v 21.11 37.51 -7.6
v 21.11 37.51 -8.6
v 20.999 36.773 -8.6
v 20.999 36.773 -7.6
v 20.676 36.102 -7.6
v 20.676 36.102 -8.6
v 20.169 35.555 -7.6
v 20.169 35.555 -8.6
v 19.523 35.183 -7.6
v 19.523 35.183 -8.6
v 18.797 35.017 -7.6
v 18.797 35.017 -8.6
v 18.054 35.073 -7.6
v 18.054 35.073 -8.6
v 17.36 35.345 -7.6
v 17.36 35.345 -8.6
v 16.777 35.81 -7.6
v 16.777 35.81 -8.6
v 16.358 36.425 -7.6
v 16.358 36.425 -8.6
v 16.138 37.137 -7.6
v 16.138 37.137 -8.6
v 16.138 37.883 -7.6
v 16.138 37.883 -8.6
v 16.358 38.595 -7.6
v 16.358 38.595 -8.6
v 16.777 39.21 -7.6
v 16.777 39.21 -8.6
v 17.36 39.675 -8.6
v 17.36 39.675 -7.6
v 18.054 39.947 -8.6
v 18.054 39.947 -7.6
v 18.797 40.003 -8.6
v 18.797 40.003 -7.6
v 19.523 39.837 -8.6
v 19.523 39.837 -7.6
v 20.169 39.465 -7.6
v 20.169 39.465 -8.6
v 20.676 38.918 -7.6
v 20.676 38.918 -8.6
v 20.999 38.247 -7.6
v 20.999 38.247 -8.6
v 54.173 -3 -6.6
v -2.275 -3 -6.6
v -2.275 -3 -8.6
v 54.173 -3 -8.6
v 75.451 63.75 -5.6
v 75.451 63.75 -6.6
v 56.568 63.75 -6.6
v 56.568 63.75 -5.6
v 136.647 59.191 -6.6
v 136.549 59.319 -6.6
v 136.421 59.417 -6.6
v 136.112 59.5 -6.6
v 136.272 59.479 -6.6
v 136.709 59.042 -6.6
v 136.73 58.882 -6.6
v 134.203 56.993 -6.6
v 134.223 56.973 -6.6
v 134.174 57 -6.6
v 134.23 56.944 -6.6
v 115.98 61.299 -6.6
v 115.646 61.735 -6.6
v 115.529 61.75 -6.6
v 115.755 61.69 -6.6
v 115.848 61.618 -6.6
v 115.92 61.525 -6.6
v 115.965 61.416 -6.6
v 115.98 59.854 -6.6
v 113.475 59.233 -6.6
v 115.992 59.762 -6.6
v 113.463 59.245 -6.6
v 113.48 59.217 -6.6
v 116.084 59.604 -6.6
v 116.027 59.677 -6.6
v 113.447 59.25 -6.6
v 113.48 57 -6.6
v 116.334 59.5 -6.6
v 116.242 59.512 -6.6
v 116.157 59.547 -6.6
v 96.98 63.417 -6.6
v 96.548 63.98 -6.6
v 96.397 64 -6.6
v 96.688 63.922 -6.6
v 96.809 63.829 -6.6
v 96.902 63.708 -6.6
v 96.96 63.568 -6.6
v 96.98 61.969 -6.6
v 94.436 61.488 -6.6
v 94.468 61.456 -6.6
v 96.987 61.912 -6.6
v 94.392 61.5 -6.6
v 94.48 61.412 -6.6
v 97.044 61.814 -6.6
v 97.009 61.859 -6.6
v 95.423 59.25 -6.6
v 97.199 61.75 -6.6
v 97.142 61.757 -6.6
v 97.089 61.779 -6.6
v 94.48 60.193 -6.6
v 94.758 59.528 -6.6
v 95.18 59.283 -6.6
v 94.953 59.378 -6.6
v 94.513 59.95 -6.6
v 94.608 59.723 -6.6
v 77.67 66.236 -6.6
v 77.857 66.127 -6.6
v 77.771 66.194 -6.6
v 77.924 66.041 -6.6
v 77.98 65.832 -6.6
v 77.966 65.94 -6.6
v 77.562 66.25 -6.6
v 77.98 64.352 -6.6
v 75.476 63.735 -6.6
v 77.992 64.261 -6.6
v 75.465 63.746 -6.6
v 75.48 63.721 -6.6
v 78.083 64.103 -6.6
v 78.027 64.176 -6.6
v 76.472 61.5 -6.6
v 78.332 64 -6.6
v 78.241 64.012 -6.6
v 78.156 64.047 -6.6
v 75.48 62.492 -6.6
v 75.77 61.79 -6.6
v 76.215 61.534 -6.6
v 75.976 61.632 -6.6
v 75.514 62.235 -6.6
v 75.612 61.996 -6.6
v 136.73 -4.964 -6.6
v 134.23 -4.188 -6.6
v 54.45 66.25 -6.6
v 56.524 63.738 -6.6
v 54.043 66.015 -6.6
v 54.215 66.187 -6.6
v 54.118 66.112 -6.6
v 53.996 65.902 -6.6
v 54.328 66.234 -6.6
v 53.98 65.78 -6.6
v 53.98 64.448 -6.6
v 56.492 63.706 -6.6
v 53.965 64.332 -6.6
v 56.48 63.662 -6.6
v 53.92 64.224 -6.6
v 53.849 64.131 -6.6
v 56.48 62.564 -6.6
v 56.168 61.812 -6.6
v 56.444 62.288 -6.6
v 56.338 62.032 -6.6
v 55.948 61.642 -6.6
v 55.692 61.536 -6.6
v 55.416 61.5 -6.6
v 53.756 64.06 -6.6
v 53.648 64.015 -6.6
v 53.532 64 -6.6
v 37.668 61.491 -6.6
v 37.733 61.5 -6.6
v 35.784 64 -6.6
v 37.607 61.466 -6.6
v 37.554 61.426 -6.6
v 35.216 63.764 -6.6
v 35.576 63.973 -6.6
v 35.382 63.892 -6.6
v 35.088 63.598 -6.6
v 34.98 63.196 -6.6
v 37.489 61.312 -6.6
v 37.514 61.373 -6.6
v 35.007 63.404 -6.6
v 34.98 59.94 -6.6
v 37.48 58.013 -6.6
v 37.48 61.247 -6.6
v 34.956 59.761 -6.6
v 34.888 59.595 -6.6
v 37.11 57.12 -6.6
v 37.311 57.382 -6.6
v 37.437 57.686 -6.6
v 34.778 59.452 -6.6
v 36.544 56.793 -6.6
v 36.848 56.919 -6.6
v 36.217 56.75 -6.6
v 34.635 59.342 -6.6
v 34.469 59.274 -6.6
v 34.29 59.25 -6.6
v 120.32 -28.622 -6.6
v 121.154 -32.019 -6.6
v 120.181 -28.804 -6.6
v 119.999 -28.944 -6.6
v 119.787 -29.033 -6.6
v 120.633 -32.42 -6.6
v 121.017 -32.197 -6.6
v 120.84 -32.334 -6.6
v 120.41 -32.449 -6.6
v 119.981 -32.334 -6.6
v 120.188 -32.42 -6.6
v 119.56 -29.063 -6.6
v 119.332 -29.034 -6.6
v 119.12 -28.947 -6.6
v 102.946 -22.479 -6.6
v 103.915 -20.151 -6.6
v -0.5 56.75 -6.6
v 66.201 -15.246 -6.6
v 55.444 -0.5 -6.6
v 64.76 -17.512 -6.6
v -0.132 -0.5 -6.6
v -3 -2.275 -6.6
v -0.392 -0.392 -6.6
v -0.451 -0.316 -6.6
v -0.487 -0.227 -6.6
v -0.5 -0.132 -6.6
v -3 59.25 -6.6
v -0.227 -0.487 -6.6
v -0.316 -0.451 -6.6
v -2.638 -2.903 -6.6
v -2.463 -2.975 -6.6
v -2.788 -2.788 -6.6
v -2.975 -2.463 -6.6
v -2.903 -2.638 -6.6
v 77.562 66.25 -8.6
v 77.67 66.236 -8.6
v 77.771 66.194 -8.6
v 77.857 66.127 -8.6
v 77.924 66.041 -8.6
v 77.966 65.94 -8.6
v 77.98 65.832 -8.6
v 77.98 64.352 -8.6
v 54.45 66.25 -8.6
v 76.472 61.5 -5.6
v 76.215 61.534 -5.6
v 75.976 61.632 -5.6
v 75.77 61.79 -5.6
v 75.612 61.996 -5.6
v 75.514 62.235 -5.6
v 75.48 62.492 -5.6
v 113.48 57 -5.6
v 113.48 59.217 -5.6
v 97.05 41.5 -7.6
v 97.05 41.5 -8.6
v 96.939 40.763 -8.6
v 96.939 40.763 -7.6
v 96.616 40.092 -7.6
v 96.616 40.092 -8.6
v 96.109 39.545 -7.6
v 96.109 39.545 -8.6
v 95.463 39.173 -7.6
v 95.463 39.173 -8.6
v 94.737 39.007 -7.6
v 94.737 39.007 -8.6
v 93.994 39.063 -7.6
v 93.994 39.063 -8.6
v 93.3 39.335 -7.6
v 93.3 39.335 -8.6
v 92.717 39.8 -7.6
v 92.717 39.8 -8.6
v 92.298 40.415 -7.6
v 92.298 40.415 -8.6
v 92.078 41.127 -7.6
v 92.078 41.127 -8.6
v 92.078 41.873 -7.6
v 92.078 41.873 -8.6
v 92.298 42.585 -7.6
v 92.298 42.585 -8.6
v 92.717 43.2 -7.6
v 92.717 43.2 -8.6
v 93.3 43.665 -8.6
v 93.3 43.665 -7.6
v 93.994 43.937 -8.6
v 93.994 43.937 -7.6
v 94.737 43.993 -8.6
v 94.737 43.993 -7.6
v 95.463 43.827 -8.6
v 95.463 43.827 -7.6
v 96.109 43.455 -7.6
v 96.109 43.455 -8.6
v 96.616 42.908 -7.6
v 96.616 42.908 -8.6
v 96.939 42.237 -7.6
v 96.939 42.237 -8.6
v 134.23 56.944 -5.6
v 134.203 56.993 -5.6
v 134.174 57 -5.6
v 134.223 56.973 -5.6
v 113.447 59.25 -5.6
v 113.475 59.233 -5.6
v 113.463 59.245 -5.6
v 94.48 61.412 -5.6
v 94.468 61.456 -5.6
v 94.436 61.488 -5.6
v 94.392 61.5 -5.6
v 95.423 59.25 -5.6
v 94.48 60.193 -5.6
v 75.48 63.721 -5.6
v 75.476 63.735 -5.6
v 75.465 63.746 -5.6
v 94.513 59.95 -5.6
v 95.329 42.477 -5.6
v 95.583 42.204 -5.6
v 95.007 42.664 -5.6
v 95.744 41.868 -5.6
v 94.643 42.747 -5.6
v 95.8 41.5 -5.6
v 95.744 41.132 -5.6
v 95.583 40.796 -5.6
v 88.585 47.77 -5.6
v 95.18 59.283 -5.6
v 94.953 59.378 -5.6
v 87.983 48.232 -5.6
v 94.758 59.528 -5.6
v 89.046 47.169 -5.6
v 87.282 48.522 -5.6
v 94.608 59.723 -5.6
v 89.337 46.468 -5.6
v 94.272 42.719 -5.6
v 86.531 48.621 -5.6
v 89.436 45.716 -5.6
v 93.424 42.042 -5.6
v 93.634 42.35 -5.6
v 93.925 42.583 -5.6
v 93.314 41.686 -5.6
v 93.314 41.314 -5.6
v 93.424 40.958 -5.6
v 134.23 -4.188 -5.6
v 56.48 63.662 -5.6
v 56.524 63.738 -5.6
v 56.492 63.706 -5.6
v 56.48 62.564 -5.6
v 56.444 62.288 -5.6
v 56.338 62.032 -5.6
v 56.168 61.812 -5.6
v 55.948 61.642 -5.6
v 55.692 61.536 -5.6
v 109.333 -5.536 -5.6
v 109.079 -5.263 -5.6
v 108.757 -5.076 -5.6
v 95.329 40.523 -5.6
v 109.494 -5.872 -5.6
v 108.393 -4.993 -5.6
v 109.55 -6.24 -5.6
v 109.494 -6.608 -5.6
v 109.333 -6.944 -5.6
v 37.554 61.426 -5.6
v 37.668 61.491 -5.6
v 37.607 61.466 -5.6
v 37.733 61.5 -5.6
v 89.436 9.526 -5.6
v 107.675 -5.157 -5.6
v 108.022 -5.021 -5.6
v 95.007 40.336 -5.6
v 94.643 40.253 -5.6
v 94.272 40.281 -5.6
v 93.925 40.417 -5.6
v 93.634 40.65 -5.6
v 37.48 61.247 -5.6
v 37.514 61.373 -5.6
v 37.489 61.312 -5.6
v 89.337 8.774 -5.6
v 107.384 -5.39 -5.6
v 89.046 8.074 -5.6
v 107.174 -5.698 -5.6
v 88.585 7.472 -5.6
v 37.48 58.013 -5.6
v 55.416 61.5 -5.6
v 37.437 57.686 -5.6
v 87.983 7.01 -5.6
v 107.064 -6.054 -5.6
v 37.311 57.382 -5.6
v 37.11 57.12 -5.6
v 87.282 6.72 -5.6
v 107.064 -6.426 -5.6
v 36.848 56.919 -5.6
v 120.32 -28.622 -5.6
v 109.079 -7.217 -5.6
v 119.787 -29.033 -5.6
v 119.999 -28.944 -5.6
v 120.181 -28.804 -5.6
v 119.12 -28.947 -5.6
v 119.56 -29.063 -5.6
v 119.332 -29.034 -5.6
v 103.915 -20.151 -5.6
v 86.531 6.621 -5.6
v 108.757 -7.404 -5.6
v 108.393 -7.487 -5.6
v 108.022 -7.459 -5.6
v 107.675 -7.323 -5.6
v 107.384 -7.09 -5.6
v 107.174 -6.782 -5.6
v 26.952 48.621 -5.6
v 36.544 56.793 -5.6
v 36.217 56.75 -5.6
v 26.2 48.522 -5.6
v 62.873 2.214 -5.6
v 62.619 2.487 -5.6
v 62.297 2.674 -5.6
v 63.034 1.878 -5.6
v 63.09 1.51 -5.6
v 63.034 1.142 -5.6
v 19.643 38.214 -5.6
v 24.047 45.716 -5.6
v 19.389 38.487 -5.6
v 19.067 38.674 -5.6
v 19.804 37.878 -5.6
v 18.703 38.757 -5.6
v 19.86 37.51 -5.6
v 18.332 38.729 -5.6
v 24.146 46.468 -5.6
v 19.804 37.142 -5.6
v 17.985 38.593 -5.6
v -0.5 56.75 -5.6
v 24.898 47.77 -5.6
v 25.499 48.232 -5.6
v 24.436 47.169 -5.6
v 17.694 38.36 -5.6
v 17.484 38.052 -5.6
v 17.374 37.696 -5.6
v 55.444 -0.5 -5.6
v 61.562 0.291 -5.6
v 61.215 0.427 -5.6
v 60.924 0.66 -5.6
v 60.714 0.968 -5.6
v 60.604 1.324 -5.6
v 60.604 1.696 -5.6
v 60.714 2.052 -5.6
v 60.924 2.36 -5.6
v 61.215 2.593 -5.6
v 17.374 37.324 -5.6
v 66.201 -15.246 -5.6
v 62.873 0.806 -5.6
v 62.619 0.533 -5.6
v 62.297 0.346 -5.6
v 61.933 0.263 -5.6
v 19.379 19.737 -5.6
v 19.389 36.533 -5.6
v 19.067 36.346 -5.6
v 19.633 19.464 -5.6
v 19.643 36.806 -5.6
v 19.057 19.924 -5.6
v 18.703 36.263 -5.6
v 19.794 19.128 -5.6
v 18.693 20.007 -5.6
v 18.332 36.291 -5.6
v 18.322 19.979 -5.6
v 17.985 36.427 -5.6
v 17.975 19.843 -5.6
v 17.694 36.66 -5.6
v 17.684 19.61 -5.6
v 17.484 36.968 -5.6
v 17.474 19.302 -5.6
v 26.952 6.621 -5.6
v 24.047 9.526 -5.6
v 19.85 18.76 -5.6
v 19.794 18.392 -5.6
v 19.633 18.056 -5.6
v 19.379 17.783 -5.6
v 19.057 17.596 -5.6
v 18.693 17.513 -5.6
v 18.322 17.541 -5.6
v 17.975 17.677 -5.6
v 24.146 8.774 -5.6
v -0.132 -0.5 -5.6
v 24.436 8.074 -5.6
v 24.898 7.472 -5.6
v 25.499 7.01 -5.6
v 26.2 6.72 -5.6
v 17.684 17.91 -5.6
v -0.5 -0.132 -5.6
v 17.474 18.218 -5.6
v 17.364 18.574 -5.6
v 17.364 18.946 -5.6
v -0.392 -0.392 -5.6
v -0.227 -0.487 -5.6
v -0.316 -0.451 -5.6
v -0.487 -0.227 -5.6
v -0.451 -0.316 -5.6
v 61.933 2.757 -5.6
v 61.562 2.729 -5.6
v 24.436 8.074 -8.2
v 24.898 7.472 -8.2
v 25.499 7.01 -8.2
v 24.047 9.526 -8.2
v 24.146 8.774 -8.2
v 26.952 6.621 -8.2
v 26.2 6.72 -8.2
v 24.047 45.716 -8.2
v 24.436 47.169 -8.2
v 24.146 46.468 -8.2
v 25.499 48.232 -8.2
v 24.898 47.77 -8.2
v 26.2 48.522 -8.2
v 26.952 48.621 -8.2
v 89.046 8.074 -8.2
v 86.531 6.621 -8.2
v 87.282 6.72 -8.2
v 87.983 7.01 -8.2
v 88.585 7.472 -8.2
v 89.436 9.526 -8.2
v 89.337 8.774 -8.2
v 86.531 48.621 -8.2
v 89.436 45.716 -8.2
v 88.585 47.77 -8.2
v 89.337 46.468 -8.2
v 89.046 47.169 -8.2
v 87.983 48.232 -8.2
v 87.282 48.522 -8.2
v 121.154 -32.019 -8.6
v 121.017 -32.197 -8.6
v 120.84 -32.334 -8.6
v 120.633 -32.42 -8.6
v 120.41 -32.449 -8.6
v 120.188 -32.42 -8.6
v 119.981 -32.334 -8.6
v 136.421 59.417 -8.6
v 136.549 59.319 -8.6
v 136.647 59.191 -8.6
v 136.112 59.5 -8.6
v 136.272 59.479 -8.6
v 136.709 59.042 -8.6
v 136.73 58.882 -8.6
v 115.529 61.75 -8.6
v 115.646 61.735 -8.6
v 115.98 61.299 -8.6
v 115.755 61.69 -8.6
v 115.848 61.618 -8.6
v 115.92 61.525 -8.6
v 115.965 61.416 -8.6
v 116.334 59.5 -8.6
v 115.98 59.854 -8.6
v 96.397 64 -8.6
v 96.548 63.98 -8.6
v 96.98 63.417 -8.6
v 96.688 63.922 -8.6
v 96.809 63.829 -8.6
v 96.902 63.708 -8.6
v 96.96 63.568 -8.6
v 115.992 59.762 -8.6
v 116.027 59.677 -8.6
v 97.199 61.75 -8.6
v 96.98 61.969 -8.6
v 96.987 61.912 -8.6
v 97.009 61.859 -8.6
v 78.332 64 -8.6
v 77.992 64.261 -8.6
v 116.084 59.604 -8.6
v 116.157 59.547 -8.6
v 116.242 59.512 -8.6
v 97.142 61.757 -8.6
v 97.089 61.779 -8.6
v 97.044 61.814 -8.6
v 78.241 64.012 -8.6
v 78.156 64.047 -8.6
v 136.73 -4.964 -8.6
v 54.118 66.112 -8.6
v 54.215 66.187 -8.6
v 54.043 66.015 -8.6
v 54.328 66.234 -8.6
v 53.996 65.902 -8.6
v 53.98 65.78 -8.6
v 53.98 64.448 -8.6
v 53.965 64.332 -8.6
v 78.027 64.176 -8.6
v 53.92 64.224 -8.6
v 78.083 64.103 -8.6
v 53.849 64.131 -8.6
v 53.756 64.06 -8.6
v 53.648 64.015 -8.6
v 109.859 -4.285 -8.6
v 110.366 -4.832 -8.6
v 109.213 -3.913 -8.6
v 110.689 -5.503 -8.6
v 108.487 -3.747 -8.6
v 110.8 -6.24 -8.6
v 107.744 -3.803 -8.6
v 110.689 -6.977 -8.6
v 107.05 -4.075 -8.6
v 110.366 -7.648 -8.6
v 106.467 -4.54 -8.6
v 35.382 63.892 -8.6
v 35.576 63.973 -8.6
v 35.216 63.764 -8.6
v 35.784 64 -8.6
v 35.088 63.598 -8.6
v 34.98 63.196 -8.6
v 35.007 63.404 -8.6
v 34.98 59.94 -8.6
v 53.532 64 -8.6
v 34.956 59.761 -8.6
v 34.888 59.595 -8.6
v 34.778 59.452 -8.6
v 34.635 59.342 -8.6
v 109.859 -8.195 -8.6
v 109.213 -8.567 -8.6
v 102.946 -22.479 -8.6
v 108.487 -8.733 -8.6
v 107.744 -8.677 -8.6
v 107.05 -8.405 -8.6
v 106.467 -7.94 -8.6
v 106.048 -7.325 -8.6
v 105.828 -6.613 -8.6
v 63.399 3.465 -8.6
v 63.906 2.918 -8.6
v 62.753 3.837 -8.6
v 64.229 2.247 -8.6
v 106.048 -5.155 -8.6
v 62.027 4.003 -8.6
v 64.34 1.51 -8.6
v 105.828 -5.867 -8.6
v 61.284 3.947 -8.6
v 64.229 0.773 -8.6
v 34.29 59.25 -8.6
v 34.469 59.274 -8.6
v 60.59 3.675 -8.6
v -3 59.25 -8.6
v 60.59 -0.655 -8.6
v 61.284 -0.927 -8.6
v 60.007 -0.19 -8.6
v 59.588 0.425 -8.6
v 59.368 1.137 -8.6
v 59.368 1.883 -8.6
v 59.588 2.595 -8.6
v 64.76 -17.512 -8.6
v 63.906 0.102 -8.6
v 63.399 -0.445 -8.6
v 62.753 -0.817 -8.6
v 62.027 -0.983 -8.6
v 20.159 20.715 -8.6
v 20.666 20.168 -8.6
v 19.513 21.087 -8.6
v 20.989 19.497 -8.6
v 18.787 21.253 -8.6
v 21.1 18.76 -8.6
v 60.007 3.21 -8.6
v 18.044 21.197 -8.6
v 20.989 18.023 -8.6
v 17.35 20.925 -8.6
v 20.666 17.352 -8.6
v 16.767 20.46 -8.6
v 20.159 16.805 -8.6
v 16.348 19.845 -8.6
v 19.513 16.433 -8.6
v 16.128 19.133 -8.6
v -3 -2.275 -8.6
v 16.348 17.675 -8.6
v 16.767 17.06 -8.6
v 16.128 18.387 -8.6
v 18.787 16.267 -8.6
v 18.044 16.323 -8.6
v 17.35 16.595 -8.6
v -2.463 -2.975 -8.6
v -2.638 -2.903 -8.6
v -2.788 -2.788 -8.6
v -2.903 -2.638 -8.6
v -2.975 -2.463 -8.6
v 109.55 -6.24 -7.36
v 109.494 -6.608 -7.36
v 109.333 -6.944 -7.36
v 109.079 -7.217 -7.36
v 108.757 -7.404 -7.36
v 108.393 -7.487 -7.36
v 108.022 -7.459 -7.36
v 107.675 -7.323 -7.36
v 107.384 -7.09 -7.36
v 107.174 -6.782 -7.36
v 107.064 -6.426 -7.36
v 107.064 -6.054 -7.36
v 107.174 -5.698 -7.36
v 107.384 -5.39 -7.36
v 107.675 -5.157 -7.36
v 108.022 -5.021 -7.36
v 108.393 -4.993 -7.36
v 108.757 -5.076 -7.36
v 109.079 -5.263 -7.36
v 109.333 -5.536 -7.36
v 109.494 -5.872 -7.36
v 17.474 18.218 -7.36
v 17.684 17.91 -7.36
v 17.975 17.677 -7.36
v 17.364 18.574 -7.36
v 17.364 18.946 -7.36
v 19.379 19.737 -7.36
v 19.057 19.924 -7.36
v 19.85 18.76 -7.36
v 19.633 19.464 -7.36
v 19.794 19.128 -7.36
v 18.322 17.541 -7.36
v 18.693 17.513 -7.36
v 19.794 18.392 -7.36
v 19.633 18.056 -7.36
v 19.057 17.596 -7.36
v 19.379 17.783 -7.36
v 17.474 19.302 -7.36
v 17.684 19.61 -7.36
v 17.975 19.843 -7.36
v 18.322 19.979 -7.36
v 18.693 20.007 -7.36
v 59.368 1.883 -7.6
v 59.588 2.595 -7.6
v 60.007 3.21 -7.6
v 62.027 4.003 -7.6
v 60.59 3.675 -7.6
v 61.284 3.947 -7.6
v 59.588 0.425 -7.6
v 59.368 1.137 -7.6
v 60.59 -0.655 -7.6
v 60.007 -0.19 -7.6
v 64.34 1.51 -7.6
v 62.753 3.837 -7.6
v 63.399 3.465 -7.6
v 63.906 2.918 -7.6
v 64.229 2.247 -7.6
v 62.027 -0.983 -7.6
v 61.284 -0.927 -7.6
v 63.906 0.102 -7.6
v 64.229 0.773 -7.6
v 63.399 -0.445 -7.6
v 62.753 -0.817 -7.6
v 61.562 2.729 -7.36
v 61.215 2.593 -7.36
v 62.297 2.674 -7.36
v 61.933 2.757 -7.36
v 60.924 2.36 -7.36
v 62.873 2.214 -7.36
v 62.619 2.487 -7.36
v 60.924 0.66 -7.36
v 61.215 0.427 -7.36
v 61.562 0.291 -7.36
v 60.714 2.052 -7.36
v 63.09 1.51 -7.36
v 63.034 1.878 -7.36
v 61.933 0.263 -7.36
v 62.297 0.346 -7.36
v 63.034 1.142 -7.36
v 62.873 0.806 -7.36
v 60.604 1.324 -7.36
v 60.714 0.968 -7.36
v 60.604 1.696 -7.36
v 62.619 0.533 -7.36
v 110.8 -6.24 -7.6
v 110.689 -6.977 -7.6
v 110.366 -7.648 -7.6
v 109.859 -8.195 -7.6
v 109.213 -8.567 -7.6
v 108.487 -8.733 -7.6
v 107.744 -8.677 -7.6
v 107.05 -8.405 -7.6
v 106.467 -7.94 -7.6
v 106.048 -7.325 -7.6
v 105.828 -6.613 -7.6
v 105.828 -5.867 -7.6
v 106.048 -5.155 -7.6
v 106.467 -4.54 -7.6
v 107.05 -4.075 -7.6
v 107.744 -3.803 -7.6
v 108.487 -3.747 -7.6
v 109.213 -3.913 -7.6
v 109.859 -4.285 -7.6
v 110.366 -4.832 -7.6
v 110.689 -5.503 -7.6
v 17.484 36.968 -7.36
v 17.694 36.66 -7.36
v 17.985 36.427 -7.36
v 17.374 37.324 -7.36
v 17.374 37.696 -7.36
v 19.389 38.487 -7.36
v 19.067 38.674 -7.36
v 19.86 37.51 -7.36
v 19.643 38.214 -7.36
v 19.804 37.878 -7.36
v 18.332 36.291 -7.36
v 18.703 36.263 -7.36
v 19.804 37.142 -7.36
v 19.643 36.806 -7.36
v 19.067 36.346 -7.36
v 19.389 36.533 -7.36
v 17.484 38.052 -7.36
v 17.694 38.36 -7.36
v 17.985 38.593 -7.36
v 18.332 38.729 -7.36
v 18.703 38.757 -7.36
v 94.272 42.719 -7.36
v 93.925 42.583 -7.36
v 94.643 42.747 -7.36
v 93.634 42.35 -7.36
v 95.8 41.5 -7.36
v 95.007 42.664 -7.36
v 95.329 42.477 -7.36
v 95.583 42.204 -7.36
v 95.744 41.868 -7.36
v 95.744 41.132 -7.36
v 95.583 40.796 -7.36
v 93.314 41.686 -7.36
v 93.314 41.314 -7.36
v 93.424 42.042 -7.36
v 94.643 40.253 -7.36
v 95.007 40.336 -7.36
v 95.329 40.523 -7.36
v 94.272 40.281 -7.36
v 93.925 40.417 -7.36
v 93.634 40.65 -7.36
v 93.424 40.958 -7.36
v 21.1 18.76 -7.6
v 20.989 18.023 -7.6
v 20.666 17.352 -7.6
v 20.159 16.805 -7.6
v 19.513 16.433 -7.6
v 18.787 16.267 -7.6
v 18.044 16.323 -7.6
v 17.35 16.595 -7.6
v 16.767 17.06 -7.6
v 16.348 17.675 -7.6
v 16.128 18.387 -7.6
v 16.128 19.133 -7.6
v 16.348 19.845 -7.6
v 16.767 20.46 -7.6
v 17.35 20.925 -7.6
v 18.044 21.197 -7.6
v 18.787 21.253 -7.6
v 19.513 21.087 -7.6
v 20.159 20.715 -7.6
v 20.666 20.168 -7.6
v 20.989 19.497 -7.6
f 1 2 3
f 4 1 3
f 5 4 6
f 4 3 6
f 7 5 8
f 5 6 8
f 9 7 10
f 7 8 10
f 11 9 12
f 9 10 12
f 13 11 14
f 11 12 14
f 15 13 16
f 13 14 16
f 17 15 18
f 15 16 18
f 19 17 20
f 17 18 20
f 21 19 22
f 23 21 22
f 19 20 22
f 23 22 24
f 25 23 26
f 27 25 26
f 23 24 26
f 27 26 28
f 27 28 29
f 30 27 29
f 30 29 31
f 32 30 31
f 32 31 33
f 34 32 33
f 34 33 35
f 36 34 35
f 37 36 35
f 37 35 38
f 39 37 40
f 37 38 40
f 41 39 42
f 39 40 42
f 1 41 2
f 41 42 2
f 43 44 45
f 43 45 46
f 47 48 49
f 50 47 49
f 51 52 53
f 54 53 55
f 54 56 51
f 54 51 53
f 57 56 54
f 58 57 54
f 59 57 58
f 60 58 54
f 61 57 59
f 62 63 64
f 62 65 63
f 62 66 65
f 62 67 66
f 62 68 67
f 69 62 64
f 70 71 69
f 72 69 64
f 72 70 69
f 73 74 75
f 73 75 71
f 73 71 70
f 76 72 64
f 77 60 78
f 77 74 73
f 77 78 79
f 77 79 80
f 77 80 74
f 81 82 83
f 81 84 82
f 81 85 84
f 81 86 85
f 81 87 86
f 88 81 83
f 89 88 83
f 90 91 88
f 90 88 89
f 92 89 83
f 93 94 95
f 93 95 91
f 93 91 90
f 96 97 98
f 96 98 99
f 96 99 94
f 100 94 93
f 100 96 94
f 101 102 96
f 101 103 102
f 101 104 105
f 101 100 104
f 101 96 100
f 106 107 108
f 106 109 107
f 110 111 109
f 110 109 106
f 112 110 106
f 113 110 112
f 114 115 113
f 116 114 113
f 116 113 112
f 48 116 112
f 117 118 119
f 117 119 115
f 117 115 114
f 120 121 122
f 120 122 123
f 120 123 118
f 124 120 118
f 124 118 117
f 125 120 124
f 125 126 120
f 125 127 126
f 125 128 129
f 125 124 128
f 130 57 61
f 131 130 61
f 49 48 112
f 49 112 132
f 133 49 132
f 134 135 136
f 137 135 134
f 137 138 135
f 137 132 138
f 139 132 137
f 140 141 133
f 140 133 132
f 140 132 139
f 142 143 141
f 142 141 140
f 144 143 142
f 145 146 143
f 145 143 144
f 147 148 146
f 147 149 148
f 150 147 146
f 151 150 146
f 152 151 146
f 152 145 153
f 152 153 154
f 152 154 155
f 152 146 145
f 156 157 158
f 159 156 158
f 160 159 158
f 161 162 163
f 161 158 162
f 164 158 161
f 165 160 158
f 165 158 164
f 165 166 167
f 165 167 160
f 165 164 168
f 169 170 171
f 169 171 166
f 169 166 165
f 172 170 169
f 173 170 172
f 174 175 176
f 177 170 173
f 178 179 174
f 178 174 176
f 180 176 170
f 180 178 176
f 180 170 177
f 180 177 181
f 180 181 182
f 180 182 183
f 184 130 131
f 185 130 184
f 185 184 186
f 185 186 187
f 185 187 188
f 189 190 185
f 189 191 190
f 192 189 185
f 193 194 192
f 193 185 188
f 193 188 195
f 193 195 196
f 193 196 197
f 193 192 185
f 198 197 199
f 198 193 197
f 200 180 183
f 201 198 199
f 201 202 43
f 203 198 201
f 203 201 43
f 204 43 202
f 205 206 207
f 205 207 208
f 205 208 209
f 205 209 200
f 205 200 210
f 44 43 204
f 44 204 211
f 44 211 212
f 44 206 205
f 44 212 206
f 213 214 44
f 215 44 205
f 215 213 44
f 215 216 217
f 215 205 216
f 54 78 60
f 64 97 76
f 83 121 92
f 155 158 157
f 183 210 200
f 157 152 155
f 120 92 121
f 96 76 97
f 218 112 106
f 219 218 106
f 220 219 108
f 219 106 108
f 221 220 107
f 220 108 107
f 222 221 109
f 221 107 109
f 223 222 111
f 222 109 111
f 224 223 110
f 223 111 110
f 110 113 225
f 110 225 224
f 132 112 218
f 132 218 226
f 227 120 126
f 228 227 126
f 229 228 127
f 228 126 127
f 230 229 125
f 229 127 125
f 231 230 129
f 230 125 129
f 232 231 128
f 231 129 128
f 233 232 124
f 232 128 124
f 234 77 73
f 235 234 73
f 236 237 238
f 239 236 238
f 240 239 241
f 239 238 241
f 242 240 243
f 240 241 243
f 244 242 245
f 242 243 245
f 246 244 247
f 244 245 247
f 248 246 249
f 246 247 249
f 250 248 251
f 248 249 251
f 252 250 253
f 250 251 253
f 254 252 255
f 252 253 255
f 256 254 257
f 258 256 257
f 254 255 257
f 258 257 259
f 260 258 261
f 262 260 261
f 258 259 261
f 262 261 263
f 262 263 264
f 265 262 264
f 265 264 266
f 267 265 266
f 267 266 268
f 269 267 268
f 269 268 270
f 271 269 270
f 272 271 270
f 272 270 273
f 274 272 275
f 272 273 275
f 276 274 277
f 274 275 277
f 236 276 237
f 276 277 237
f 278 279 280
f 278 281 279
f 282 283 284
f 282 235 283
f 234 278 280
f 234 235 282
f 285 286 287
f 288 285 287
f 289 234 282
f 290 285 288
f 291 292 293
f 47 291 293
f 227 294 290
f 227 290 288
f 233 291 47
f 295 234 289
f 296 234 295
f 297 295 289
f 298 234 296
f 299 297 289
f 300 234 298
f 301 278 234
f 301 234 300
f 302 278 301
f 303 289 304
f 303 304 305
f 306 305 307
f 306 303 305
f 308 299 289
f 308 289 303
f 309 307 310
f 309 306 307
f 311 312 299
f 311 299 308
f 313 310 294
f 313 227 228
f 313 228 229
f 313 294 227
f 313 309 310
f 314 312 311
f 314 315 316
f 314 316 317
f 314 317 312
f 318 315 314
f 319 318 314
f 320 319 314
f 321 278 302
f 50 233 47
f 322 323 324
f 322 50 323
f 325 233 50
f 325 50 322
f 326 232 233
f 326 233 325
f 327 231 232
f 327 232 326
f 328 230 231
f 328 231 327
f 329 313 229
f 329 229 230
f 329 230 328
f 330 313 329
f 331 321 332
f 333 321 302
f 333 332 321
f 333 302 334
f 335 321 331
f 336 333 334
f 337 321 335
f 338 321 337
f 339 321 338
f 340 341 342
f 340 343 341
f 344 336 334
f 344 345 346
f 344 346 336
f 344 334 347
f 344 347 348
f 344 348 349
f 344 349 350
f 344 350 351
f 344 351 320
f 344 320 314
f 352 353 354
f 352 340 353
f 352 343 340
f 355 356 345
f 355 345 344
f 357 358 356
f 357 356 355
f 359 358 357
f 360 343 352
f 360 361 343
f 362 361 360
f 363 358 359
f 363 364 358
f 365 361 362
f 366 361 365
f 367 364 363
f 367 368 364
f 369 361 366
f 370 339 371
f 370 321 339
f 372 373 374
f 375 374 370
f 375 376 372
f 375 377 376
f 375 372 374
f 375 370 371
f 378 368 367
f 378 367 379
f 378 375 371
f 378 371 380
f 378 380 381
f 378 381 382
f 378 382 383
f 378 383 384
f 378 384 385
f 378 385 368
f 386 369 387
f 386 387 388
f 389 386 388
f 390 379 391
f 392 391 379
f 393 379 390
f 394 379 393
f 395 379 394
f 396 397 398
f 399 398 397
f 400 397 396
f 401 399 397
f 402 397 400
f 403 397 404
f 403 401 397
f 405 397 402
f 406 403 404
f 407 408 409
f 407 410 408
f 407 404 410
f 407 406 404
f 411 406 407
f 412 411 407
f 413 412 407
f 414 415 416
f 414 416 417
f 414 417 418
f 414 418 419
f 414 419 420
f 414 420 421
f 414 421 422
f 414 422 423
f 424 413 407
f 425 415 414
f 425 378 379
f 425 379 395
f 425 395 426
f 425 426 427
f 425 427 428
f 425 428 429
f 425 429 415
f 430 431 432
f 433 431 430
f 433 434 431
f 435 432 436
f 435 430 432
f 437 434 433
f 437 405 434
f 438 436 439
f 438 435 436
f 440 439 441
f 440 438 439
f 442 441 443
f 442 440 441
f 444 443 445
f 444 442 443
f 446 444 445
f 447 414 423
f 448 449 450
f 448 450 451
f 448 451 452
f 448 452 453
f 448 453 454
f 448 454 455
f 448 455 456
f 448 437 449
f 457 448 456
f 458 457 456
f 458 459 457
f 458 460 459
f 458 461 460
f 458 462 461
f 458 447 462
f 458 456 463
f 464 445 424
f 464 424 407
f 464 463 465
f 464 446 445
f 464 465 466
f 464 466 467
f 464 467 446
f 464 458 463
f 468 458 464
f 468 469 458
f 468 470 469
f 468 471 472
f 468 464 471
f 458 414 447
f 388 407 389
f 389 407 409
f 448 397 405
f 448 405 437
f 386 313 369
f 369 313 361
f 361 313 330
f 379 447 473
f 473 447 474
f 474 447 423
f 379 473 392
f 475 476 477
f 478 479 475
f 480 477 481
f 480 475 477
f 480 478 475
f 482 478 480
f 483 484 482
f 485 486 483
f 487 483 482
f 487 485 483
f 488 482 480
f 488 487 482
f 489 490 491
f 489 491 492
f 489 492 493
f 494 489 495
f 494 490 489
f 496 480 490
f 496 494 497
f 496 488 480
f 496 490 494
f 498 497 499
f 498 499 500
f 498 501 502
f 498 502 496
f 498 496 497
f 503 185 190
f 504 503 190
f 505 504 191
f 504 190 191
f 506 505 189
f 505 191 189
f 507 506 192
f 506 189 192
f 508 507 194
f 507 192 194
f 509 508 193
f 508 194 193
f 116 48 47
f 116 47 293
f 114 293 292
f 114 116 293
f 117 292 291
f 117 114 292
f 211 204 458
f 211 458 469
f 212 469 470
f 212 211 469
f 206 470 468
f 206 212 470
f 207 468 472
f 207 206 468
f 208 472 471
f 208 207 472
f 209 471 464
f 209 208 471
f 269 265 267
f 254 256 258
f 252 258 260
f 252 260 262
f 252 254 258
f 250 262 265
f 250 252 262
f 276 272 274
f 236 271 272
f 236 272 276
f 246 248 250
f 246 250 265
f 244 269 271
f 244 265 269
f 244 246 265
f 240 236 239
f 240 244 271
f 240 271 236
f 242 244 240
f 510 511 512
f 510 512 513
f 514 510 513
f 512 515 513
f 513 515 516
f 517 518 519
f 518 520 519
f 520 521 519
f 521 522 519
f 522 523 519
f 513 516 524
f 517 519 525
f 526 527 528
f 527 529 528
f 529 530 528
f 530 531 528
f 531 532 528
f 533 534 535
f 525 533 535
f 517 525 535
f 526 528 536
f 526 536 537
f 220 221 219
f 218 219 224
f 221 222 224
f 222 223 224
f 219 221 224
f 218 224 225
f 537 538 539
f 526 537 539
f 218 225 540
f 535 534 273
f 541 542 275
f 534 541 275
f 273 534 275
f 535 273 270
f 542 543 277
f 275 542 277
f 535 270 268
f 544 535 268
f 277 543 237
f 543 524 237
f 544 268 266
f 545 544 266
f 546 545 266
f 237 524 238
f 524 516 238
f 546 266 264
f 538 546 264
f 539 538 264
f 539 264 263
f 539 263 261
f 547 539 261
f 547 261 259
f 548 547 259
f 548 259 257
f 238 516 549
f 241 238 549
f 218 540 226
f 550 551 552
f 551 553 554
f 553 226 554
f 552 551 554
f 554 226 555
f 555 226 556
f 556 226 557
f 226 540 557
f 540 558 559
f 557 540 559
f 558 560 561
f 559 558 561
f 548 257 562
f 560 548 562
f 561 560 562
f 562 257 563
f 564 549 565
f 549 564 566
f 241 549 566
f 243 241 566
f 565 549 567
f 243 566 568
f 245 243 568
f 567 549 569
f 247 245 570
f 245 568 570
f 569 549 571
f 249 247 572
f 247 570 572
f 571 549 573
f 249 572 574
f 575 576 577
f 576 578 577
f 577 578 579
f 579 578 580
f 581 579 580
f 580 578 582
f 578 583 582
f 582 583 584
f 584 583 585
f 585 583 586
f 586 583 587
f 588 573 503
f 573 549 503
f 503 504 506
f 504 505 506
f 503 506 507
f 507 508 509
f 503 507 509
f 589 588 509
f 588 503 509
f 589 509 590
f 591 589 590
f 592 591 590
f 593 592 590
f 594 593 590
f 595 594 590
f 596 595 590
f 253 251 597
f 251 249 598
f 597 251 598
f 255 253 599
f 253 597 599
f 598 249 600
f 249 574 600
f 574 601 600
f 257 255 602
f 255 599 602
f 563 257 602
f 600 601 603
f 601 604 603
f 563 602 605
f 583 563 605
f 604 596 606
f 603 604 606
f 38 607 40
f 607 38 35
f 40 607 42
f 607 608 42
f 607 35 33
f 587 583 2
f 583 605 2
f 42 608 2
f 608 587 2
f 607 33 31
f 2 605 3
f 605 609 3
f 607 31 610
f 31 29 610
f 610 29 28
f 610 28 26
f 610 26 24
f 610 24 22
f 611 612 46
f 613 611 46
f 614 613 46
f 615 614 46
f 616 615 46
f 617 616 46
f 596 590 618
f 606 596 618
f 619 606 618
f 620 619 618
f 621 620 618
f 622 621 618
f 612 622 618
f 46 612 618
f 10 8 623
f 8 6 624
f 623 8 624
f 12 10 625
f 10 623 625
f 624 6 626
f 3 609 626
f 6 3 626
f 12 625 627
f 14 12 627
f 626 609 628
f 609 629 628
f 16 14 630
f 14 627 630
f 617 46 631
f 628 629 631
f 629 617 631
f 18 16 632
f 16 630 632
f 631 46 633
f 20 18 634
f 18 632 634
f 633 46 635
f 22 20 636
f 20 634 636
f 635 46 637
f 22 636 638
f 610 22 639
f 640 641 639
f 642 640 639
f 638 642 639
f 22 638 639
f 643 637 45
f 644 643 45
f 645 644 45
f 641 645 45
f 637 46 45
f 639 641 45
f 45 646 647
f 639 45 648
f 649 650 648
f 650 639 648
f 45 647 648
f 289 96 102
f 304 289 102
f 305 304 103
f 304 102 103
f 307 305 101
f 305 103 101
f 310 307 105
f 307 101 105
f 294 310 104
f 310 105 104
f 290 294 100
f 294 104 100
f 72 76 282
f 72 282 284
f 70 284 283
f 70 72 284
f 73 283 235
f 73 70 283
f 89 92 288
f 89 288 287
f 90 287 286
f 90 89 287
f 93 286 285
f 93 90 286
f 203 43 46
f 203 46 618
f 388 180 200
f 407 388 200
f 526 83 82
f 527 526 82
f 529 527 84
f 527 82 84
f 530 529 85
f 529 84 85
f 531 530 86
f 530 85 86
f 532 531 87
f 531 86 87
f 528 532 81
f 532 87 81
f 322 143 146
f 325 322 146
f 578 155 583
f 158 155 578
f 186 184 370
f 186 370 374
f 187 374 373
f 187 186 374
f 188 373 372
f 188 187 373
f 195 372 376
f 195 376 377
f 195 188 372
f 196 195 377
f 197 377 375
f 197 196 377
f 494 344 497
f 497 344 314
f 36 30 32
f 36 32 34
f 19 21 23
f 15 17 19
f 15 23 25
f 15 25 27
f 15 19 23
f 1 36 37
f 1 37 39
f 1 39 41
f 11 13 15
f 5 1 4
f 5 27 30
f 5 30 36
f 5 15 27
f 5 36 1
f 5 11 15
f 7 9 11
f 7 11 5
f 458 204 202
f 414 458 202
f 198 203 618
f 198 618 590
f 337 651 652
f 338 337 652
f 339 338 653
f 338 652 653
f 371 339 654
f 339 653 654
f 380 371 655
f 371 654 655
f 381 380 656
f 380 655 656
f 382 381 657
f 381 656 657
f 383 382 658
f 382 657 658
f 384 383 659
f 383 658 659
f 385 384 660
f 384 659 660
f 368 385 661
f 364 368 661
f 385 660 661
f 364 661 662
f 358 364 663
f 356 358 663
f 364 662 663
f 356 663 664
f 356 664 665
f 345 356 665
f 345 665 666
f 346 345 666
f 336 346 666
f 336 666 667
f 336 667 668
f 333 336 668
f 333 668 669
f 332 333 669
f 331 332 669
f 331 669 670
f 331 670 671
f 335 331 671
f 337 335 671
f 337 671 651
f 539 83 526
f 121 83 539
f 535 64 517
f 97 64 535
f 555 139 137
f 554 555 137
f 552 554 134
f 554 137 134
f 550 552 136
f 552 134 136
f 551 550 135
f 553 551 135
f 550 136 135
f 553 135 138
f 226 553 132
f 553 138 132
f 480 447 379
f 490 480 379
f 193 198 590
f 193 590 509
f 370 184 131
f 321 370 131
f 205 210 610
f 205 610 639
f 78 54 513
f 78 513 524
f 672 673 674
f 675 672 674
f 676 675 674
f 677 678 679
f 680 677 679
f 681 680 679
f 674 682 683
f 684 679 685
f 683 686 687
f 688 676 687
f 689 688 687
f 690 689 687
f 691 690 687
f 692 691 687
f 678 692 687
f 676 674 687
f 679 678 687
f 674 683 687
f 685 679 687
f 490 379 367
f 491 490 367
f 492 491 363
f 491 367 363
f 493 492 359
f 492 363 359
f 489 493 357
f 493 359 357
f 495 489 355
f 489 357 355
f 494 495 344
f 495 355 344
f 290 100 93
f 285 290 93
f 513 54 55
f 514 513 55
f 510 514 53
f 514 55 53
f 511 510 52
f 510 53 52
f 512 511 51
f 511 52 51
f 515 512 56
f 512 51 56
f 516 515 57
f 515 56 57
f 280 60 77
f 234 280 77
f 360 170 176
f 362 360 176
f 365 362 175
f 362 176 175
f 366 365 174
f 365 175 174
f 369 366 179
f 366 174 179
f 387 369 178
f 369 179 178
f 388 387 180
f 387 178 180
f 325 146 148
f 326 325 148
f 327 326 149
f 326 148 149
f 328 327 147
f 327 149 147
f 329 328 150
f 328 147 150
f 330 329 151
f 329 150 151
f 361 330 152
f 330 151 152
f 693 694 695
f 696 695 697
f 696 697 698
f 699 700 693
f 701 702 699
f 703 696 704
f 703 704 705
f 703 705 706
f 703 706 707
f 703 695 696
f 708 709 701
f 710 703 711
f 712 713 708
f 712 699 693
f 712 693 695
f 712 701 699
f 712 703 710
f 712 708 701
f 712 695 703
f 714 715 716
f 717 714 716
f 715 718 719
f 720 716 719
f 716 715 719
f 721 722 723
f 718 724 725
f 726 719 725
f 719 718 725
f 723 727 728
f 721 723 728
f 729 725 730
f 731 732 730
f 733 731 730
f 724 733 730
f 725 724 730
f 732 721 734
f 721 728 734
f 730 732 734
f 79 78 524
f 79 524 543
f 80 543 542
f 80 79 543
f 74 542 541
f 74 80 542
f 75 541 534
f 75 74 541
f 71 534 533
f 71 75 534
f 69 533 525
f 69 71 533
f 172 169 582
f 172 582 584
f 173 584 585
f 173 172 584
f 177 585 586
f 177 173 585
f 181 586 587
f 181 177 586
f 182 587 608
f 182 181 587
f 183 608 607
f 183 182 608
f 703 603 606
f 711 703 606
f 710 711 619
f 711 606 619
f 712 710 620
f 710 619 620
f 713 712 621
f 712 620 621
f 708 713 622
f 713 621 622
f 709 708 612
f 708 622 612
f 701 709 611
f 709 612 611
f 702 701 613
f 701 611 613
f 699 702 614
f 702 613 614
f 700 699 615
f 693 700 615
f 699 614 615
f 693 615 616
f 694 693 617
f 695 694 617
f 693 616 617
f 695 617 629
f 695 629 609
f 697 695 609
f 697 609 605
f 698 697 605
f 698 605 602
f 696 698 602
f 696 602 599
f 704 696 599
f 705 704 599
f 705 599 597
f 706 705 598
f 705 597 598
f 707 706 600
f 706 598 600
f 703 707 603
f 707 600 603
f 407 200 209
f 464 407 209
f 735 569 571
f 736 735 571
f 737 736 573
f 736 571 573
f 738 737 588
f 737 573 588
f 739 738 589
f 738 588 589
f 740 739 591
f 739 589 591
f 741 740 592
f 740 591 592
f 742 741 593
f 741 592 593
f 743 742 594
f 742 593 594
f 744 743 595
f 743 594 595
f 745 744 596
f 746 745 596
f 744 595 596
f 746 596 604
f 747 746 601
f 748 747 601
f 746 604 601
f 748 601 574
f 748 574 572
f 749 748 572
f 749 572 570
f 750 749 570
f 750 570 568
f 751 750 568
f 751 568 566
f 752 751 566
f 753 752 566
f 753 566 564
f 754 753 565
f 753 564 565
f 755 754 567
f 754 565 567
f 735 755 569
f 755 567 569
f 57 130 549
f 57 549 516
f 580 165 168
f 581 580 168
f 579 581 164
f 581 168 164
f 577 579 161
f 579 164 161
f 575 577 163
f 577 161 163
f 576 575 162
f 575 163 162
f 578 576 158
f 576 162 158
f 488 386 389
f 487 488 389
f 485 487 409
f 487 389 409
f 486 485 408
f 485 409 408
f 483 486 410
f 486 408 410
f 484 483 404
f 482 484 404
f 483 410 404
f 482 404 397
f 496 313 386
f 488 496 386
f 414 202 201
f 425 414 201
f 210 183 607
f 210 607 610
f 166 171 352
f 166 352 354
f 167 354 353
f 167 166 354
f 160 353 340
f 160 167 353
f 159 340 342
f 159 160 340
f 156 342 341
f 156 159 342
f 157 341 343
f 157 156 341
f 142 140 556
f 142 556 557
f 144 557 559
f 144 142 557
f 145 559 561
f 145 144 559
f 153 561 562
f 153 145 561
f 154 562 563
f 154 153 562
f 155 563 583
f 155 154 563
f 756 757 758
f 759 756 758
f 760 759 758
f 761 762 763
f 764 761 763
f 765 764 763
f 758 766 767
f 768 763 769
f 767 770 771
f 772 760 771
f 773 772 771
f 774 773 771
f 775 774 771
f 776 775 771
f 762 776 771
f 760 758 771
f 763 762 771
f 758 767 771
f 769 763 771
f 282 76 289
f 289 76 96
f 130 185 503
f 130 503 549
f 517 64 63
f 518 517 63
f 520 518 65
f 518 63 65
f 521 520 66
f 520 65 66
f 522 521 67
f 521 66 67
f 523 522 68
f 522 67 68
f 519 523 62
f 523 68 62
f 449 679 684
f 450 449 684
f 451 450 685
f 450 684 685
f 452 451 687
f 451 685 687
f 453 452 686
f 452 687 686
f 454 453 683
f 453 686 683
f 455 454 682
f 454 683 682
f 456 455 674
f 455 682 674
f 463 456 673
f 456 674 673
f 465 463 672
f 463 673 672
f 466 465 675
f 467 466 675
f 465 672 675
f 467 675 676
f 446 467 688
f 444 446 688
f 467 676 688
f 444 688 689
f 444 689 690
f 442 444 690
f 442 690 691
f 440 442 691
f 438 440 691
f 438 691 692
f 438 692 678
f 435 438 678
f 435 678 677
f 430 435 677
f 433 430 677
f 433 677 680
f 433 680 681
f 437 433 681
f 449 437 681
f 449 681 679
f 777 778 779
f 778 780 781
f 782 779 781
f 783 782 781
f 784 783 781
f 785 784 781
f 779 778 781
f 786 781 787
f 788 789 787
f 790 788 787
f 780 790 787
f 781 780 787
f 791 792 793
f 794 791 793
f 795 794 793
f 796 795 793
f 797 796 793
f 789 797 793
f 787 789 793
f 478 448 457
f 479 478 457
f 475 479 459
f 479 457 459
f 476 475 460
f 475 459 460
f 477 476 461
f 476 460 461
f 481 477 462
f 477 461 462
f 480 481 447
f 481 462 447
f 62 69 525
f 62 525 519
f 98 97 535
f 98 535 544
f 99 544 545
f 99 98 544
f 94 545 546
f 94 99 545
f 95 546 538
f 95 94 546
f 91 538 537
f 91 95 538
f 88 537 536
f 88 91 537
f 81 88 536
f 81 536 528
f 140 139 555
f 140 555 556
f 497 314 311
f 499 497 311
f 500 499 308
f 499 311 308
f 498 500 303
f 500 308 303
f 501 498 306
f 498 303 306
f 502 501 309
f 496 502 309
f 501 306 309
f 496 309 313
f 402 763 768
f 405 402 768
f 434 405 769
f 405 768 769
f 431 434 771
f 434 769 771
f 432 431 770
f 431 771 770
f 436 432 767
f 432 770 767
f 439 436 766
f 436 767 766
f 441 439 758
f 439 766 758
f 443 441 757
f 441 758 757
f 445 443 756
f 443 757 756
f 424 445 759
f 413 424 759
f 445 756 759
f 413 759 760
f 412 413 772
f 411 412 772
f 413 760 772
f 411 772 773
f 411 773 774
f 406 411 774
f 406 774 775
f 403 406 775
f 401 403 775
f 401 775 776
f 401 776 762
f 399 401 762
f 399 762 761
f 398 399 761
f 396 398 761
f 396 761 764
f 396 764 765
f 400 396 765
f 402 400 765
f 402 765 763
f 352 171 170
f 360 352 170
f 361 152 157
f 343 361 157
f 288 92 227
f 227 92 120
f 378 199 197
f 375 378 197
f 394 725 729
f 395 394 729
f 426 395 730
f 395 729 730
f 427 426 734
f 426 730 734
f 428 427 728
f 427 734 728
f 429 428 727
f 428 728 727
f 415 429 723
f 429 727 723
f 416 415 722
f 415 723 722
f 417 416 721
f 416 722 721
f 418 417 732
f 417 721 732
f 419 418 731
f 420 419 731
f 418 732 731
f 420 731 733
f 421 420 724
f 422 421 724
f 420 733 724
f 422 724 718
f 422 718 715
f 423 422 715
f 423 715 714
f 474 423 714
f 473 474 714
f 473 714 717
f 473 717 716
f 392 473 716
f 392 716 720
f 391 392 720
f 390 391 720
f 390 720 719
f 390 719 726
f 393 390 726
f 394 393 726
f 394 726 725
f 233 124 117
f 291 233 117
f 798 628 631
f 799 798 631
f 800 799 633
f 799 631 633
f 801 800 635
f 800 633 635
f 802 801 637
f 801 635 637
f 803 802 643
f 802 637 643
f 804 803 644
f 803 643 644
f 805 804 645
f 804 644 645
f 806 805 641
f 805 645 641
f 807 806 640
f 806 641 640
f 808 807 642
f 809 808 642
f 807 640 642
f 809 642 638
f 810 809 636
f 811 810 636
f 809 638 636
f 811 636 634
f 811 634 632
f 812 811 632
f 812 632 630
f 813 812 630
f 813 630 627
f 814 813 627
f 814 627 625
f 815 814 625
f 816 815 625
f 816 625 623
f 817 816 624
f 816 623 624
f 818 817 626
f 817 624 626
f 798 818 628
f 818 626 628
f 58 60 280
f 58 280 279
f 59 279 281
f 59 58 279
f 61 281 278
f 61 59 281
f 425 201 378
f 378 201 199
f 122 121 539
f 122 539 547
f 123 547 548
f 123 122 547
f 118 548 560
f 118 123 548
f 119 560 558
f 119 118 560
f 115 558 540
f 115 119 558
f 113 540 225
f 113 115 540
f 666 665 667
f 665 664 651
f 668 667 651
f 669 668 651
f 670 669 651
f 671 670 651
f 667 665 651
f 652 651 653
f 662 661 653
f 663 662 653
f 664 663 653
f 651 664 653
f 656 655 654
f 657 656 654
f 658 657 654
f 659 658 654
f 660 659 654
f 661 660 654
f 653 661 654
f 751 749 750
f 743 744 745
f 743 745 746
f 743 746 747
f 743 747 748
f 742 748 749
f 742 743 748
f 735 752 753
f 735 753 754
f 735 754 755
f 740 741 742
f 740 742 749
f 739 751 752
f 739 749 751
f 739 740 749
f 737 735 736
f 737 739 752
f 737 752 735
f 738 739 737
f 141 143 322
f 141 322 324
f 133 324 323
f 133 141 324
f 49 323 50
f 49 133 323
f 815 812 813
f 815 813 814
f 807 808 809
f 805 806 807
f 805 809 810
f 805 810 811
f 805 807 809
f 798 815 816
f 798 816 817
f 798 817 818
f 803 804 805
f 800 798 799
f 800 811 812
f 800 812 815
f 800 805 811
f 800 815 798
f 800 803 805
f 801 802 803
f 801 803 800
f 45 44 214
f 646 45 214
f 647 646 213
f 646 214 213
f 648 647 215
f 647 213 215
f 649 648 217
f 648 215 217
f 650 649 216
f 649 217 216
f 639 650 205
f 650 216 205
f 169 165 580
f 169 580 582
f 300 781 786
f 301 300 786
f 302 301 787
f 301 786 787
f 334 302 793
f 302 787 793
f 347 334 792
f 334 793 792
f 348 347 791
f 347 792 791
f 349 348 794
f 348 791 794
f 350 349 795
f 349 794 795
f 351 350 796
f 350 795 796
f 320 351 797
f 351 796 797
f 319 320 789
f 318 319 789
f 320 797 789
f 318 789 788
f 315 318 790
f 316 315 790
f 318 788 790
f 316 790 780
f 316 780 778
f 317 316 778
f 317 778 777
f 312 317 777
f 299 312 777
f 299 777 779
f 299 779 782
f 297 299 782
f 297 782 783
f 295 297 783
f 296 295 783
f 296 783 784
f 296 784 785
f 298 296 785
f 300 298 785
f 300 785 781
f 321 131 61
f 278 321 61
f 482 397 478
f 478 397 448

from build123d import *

# Parameters (mm, degrees)
PAD022_DEPTH    = 2
PAD023_DEPTH    = 1
SKETCH097_R     = 1.25
POCKET015_DEPTH = 3.001
POCKET017_DEPTH = 2.6
SKETCH106_R     = 2.5
POCKET020_DEPTH = 1
SKETCH107_R     = 1.264414
SKETCH107_R_2   = 1.25
PAD027_DEPTH    = 0.24


with BuildPart() as part:
    # Sketch095 (on Face1 of ShapeBinder) → Pad022 (new body)
    with BuildSketch(Plane(origin=(0, 0, -16), x_dir=(1, 0, 0), z_dir=(0, 0, -1))):
        with BuildLine():
            Line((-2.2752, 3), (54.173381, 3))
            Line((54.173381, 3), (64.759843, 17.512342))
            Line((64.759843, 17.512342), (102.945986, 22.478633))
            Line((102.945986, 22.478633), (119.981121, 32.333705))
            ThreePointArc((121.153574, 32.019327), (120.632553, 32.419699), (119.981121, 32.333705))
            Line((121.153574, 32.019327), (136.73, 4.963884))
            Line((136.73, 4.963884), (136.73, -58.882076))
            ThreePointArc((136.112076, -59.5), (136.549014, -59.319014), (136.73, -58.882076))
            Line((136.112076, -59.5), (116.333806, -59.5))
            ThreePointArc((116.333806, -59.5), (116.083627, -59.603627), (115.98, -59.853806))
            Line((115.98, -59.853806), (115.98, -61.299282))
            ThreePointArc((115.529282, -61.75), (115.847988, -61.617988), (115.98, -61.299282))
            Line((115.529282, -61.75), (97.198754, -61.75))
            ThreePointArc((97.198754, -61.75), (97.044072, -61.814072), (96.98, -61.968754))
            Line((96.98, -61.968754), (96.98, -63.416556))
            ThreePointArc((96.396556, -64), (96.809113, -63.829113), (96.98, -63.416556))
            Line((96.396556, -64), (78.3317, -64))
            ThreePointArc((78.3317, -64), (78.083011, -64.103011), (77.98, -64.3517))
            Line((77.98, -64.3517), (77.98, -65.831599))
            ThreePointArc((77.561599, -66.25), (77.857453, -66.127453), (77.98, -65.831599))
            Line((77.561599, -66.25), (54.449571, -66.25))
            ThreePointArc((53.98, -65.780429), (54.117534, -66.112466), (54.449571, -66.25))
            Line((53.98, -65.780429), (53.98, -64.448303))
            ThreePointArc((53.98, -64.448303), (53.848695, -64.131305), (53.531697, -64))
            Line((53.531697, -64), (35.784272, -64))
            ThreePointArc((34.98, -63.195728), (35.215566, -63.764434), (35.784272, -64))
            Line((34.98, -63.195728), (34.98, -59.939901))
            ThreePointArc((34.98, -59.939901), (34.777933, -59.452067), (34.290099, -59.25))
            Line((34.290099, -59.25), (-3, -59.25))
            Line((-3, -59.25), (-3, 2.2752))
            ThreePointArc((-2.2752, 3), (-2.787711, 2.787711), (-3, 2.2752))
        make_face()
    extrude(amount=PAD022_DEPTH)

    # Sketch096 (on Face1 of ShapeBinder) → Pad023 (join)
    with BuildSketch(Plane(origin=(0, 0, -16), x_dir=(1, 0, 0), z_dir=(0, 0, -1))):
        with BuildLine():
            Line((-0.132, 0.5), (55.444173, 0.5))
            Line((55.444173, 0.5), (66.201245, 15.24622))
            Line((66.201245, 15.24622), (103.915077, 20.151085))
            Line((103.915077, 20.151085), (119.119523, 28.947076))
            ThreePointArc((120.320286, 28.621968), (119.787102, 29.032711), (119.119523, 28.947076))
            Line((120.320286, 28.621968), (134.23, 4.188169))
            Line((134.23, 4.188169), (134.23, -56.944054))
            ThreePointArc((134.174054, -57), (134.214403, -56.984403), (134.23, -56.944054))
            Line((134.174054, -57), (113.48, -57))
            Line((113.48, -57), (113.48, -59.216584))
            ThreePointArc((113.446584, -59.25), (113.470113, -59.240113), (113.48, -59.216584))
            Line((113.446584, -59.25), (95.423253, -59.25))
            ThreePointArc((95.423253, -59.25), (94.757913, -59.527912), (94.48, -60.193252))
            Line((94.48, -60.193252), (94.48, -61.412355))
            ThreePointArc((94.392355, -61.5), (94.454172, -61.474172), (94.48, -61.412355))
            Line((94.392355, -61.5), (76.471748, -61.5))
            ThreePointArc((76.471748, -61.5), (75.770092, -61.790091), (75.48, -62.491747))
            Line((75.48, -62.491747), (75.48, -63.721105))
            ThreePointArc((75.451105, -63.75), (75.471446, -63.741446), (75.48, -63.721105))
            Line((75.451105, -63.75), (56.567844, -63.75))
            ThreePointArc((56.48, -63.662156), (56.505729, -63.724271), (56.567844, -63.75))
            Line((56.48, -63.662156), (56.48, -62.563591))
            ThreePointArc((56.48, -62.563591), (56.168481, -61.811519), (55.416409, -61.5))
            Line((55.416409, -61.5), (37.73341, -61.5))
            ThreePointArc((37.48, -61.24659), (37.554222, -61.425778), (37.73341, -61.5))
            Line((37.48, -61.24659), (37.48, -58.013133))
            ThreePointArc((37.48, -58.013133), (37.110037, -57.119963), (36.216867, -56.75))
            Line((36.216867, -56.75), (-0.5, -56.75))
            Line((-0.5, -56.75), (-0.5, 0.132))
            ThreePointArc((-0.132, 0.5), (-0.392215, 0.392215), (-0.5, 0.132))
        make_face()
    extrude(amount=-PAD023_DEPTH)

    # Sketch097 → Pocket015 (cut, through all)
    with BuildSketch(Plane(origin=(0, 0, -18), x_dir=(1, 0, 0), z_dir=(0, 0, -1))):
        with Locations((18.61, -37.509997)):
            Circle(SKETCH097_R)
        with Locations((18.6, -18.76)):
            Circle(SKETCH097_R)
        with Locations((61.84, -1.51)):
            Circle(SKETCH097_R)
        with Locations((108.3, 6.24)):
            Circle(SKETCH097_R)
        with Locations((94.55, -41.5)):
            Circle(SKETCH097_R)
    extrude(amount=-POCKET015_DEPTH, mode=Mode.SUBTRACT)

    # Sketch100 → Pocket017 (cut)
    with BuildSketch(Plane.XY.offset(-15)):
        with BuildLine():
            Line((24.046659, 45.716233), (24.046659, 9.526233))
            ThreePointArc((24.046659, 9.526233), (24.897514, 7.472088), (26.951659, 6.621233))
            Line((26.951659, 6.621233), (86.530577, 6.621233))
            ThreePointArc((86.530577, 6.621233), (88.584722, 7.472088), (89.435577, 9.526233))
            Line((89.435577, 9.526233), (89.435577, 45.716233))
            ThreePointArc((89.435577, 45.716233), (88.584722, 47.770378), (86.530577, 48.621233))
            Line((86.530577, 48.621233), (26.951659, 48.621233))
            ThreePointArc((26.951659, 48.621233), (24.897514, 47.770378), (24.046659, 45.716233))
        make_face()
    extrude(amount=-POCKET017_DEPTH, mode=Mode.SUBTRACT)

    # Sketch106 (on Face5 of Pocket017) → Pocket020 (cut)
    with BuildSketch(Plane(origin=(0, 0, -18), x_dir=(1, 0, 0), z_dir=(0, 0, -1))):
        with Locations((61.84, -1.51)):
            Circle(SKETCH106_R)
        with Locations((108.3, 6.24)):
            Circle(SKETCH106_R)
        with Locations((94.55, -41.5)):
            Circle(SKETCH106_R)
        with Locations((18.61, -37.509997)):
            Circle(SKETCH106_R)
        with Locations((18.6, -18.76)):
            Circle(SKETCH106_R)
    extrude(amount=-POCKET020_DEPTH, mode=Mode.SUBTRACT)

    # Sketch107 (on Face70 of Pocket020) → Pad027 (join)
    with BuildSketch(Plane(origin=(0, 0, -17), x_dir=(1, 0, 0), z_dir=(0, 0, -1))):
        with Locations((61.84, -1.51)):
            Circle(SKETCH107_R)
        with Locations((18.6, -18.76)):
            Circle(SKETCH107_R_2)
        with Locations((108.3, 6.24)):
            Circle(SKETCH107_R_2)
        with Locations((94.55, -41.5)):
            Circle(SKETCH107_R_2)
        with Locations((18.61, -37.509997)):
            Circle(SKETCH107_R_2)
    extrude(amount=-PAD027_DEPTH)


with BuildPart() as part_1:
    # Body placement: moved
    add(part.part.moved(Location((0, 0, 9.4))))


solid = part_1.part
